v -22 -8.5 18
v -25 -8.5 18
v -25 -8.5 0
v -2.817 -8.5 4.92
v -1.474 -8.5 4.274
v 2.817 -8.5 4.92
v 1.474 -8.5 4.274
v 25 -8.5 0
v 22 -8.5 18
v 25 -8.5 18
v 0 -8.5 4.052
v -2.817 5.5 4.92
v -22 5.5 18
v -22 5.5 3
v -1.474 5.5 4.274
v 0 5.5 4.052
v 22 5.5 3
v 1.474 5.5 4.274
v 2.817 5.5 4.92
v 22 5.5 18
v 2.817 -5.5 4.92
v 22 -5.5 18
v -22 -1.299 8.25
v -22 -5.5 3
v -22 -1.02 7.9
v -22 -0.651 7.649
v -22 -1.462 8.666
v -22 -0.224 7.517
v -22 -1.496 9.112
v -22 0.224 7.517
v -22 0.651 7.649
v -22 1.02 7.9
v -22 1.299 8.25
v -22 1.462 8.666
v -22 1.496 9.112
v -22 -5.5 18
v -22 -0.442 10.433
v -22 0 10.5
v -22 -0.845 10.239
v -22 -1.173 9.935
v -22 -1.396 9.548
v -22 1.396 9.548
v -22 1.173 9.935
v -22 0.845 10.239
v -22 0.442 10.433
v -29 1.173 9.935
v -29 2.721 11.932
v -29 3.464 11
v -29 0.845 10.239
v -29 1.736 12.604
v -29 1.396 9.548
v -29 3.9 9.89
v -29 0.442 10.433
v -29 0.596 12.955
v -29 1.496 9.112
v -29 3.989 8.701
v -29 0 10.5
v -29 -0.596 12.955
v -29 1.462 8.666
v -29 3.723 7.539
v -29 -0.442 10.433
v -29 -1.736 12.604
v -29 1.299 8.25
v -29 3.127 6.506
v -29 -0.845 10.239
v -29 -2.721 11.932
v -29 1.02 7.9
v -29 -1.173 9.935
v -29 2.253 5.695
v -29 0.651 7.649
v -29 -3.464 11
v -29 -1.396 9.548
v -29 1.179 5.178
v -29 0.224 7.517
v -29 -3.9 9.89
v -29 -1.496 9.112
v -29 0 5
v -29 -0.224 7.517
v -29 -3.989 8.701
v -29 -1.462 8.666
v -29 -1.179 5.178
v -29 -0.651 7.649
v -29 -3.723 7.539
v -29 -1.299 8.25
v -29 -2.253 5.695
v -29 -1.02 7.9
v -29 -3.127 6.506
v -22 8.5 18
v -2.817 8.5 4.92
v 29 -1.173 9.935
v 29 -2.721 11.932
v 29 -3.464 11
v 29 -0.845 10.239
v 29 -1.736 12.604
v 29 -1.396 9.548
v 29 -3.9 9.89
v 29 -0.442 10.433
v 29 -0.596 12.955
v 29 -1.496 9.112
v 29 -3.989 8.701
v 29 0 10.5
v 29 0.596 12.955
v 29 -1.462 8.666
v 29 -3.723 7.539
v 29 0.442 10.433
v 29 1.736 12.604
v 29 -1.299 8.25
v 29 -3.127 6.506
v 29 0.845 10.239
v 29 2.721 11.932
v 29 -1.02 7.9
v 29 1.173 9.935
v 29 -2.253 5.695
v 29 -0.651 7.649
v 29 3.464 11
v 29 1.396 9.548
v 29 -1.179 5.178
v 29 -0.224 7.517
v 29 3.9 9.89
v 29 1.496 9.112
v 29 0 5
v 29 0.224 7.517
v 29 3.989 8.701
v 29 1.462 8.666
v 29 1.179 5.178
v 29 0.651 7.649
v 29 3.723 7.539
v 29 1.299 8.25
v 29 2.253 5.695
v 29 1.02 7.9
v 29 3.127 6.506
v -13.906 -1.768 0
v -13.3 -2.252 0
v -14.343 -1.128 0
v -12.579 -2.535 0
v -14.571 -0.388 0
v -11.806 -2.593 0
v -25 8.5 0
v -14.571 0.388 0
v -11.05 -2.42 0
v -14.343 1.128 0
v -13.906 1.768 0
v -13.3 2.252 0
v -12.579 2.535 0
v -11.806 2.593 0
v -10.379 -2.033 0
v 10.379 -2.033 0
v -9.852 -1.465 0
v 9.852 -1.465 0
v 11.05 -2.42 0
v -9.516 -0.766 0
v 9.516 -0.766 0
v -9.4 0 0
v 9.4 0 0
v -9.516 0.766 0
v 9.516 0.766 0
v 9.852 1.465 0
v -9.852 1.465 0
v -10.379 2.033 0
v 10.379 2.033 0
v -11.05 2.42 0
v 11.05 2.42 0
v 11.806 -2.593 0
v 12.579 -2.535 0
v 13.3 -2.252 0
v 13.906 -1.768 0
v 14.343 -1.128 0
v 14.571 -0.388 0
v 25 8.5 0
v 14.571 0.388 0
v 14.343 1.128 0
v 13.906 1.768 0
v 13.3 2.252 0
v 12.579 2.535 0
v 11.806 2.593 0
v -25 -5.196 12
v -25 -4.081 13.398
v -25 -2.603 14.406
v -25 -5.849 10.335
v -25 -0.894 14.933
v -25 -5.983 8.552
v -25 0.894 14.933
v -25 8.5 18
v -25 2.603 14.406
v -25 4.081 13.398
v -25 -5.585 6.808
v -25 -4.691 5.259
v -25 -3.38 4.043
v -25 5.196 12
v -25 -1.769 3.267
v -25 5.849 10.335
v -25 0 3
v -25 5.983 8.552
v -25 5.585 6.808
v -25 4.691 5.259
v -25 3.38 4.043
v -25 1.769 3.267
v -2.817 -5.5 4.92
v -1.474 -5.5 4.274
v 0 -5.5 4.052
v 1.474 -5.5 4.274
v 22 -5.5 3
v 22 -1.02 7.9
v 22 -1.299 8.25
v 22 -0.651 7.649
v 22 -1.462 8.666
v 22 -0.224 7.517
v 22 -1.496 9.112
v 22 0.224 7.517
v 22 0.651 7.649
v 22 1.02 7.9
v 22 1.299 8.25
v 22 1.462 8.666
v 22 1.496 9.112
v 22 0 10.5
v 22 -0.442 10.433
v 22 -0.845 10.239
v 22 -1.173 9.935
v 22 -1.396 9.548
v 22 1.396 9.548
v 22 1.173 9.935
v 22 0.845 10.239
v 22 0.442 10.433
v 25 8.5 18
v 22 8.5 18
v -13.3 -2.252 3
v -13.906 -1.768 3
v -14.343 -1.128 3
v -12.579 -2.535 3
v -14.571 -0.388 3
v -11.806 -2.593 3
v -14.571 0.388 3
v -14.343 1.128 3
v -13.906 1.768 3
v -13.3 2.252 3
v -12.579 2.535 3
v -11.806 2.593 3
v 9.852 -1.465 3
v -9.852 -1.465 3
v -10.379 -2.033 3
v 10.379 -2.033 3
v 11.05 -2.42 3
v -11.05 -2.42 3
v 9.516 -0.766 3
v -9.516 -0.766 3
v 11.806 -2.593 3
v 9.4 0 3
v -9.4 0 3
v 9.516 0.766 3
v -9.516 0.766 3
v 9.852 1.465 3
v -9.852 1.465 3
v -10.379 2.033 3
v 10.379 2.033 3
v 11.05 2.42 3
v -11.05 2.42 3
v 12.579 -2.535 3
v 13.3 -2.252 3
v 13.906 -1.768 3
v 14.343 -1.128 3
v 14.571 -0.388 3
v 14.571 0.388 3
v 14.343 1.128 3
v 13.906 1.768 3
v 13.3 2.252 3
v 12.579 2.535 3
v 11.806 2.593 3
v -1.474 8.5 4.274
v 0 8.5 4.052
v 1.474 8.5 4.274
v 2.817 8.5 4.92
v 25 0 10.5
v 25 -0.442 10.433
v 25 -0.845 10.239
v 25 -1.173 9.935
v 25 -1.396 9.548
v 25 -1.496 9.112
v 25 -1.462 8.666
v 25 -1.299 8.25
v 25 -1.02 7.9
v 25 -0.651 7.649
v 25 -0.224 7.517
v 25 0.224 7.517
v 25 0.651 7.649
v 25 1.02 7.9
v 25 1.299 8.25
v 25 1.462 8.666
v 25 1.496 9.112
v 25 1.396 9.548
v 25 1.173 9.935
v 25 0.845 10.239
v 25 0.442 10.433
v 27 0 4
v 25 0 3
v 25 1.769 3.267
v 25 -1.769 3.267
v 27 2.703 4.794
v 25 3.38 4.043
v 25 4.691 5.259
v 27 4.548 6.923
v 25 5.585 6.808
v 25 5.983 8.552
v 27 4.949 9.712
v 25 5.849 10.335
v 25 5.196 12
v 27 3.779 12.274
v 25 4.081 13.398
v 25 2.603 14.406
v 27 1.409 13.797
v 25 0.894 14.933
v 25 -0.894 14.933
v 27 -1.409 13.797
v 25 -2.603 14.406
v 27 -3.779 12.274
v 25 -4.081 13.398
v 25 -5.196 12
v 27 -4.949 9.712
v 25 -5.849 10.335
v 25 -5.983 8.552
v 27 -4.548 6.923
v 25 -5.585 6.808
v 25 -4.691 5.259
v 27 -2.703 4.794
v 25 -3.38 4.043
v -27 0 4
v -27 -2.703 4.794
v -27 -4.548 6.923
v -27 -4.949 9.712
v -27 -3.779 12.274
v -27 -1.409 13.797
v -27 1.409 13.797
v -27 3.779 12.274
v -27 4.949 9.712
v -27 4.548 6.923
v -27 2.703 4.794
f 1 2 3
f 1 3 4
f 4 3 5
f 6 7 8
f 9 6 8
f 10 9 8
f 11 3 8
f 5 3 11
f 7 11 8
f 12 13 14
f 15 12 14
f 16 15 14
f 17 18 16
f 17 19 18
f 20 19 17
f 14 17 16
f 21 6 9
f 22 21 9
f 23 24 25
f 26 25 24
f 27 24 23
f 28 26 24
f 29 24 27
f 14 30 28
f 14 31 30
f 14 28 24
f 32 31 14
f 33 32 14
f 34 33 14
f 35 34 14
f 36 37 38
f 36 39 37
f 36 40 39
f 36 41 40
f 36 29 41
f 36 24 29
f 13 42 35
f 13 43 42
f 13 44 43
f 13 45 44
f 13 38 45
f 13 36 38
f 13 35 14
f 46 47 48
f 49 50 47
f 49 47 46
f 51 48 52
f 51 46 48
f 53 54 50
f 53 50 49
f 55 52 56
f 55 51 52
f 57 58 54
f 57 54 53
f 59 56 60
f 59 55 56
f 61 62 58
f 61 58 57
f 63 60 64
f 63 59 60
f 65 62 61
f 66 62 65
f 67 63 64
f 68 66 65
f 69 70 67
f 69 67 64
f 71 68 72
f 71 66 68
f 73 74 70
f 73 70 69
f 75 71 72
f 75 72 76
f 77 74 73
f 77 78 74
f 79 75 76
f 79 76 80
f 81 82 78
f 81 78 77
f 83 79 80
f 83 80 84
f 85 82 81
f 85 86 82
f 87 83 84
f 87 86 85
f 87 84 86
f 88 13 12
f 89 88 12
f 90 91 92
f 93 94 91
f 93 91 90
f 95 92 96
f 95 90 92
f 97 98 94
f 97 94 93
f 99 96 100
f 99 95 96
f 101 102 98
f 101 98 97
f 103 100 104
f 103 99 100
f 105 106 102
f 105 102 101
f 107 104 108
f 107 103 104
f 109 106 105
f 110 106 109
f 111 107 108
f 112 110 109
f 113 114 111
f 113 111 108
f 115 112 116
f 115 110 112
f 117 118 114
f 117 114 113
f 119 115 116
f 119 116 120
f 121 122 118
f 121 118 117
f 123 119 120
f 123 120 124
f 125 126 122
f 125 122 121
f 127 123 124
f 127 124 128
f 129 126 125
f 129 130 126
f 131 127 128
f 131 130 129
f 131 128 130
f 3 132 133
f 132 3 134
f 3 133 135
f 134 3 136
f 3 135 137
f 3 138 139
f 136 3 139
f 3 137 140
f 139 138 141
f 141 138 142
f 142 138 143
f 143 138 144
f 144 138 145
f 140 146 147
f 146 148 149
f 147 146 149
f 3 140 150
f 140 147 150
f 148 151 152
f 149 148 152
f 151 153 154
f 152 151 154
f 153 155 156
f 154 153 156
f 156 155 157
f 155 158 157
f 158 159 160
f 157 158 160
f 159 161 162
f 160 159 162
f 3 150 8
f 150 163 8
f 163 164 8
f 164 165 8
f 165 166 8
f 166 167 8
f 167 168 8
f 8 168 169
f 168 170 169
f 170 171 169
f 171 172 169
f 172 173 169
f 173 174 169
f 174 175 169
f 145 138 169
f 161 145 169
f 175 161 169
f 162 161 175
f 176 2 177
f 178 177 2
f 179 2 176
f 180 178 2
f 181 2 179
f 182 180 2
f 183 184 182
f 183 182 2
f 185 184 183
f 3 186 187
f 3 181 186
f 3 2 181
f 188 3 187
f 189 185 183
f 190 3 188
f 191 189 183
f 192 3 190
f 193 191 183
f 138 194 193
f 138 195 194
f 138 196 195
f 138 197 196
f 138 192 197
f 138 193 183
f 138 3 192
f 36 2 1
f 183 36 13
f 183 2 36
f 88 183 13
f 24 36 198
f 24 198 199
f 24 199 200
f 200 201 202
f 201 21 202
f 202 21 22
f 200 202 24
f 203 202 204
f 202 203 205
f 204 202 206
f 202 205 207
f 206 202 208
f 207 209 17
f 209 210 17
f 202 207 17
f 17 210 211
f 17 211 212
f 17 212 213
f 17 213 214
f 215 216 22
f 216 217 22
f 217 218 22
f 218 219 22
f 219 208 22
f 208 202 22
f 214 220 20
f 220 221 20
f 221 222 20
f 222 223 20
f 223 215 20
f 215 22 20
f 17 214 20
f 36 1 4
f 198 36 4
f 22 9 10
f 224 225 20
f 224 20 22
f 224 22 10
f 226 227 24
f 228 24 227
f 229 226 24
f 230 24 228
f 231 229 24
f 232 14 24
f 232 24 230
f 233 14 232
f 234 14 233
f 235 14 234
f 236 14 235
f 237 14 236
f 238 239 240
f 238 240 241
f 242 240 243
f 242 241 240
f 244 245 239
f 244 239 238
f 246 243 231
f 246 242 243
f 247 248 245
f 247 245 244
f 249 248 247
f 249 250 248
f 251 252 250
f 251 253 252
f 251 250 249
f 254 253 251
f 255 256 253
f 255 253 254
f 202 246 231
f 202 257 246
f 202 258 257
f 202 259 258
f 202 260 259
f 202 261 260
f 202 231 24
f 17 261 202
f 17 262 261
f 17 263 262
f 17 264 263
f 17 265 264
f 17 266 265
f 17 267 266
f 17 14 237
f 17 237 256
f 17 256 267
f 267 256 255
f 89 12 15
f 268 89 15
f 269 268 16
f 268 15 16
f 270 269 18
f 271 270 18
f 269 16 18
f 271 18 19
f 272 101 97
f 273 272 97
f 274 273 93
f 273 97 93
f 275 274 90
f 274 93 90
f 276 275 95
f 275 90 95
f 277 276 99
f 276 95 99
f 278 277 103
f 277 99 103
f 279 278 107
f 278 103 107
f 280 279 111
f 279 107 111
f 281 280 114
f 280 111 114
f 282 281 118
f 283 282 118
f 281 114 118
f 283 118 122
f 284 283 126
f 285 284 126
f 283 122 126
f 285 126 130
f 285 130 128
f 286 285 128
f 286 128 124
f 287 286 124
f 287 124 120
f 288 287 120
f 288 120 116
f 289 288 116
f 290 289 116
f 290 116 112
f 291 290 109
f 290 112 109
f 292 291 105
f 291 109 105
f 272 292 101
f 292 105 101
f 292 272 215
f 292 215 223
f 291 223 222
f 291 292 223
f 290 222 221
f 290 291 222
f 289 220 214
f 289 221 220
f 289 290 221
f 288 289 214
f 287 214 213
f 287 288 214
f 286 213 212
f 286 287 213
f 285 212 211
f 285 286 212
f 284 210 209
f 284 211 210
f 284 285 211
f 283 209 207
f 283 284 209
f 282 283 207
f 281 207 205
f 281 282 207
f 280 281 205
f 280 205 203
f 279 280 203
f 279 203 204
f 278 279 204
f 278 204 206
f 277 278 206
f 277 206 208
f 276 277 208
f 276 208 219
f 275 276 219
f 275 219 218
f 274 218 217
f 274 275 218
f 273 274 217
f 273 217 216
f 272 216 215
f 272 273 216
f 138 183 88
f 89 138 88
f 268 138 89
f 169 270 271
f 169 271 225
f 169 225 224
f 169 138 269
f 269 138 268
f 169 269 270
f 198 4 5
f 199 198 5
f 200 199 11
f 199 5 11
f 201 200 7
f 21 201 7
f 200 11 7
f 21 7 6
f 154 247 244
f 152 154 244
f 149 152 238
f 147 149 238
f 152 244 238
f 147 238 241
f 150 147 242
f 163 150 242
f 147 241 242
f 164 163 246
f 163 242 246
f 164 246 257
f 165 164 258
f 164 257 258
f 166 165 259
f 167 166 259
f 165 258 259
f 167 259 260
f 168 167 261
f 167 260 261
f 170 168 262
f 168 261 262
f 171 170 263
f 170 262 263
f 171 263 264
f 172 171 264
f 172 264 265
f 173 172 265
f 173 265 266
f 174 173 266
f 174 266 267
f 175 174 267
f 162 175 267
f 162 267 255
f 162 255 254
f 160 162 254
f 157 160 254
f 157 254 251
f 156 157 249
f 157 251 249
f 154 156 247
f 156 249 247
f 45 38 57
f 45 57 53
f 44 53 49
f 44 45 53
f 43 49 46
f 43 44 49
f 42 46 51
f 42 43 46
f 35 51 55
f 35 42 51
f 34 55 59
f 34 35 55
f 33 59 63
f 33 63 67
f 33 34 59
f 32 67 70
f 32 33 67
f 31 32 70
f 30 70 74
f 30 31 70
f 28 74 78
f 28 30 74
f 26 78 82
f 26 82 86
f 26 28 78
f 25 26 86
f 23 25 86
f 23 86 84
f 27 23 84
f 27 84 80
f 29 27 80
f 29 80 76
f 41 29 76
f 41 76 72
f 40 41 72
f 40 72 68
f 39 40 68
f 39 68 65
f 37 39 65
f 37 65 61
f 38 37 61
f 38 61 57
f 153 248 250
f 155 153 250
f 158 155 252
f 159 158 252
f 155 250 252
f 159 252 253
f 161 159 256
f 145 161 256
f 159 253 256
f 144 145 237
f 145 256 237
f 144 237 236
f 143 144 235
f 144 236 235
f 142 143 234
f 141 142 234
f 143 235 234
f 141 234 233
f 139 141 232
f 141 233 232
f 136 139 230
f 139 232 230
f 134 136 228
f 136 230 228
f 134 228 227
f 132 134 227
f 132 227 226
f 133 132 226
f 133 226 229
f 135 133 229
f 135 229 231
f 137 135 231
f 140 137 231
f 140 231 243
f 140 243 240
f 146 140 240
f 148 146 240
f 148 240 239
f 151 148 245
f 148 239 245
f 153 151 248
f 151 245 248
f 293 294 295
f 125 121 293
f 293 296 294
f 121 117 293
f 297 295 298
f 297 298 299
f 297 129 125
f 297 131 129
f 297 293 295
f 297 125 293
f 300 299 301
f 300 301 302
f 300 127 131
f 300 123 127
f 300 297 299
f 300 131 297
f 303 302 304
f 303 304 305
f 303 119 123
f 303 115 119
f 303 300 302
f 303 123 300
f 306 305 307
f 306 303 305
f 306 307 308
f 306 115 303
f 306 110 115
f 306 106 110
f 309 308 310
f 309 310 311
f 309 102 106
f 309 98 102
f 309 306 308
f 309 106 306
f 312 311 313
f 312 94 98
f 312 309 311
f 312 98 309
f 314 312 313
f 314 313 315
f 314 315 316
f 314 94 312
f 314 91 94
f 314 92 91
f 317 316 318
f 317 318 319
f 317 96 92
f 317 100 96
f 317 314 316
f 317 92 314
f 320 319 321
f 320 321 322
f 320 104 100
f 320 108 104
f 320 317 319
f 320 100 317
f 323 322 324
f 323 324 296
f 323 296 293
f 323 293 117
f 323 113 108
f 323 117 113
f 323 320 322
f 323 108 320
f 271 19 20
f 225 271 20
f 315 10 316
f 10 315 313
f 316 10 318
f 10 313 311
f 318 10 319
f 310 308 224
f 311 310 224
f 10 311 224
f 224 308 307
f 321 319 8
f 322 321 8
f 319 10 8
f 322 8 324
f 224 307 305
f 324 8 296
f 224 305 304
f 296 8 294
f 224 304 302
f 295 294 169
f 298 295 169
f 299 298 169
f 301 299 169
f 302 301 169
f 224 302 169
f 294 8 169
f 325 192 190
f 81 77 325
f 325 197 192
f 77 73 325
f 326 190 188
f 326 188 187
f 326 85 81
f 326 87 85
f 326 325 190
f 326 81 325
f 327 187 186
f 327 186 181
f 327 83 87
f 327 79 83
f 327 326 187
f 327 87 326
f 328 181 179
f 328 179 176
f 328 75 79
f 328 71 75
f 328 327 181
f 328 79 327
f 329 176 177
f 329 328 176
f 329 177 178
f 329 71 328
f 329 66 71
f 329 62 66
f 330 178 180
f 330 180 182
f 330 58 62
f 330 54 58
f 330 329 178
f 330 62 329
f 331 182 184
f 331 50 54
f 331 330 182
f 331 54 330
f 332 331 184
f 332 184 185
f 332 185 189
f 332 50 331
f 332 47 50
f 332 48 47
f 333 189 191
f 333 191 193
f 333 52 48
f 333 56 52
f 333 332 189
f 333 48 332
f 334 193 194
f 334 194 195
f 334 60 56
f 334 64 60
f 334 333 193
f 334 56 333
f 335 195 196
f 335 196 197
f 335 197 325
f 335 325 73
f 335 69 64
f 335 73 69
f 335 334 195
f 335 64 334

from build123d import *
from OCP.BRepFilletAPI import BRepFilletAPI_MakeChamfer

# Parameters (mm, degrees)
SKETCH_1_W               = 50
SKETCH_1_H               = 17
EXTRUDE_1_DEPTH          = 18
SKETCH_2_W               = 44
SKETCH_2_H               = 11
CUT_EXTRUDE_1_DEPTH      = 15
CUT_EXTRUDE_2_DEPTH      = 36.185224172
CUT_EXTRUDE_2_DEPTH_BACK = 17
SKETCH_4_R               = 2.6
CUT_EXTRUDE_4_DEPTH      = 3
SKETCH_5_R               = 4
SKETCH_5_R_2             = 1.5
EXTRUDE_2_DEPTH          = 4
EXTRUDE_START            = 4
SKETCH_6_R               = 4
SKETCH_6_R_2             = 1.5
EXTRUDE_3_DEPTH          = 4
CHAMFER_1_SIZE           = 2
CHAMFER_1_SIZE_2         = 4
CUT_EXTRUDE_START        = -50
SKETCH_7_R               = 1.5
CUT_EXTRUDE_5_DEPTH      = 50


with BuildPart() as part:
    # 草图1 → 凸台-拉伸1 (new body)
    with BuildSketch(Plane.XY):
        Rectangle(SKETCH_1_W, SKETCH_1_H)
    extrude(amount=EXTRUDE_1_DEPTH)

    # 草图2 → 切除-拉伸1 (cut)
    with BuildSketch(Plane.XY.offset(18)):
        Rectangle(SKETCH_2_W, SKETCH_2_H)
    extrude(amount=-CUT_EXTRUDE_1_DEPTH, mode=Mode.SUBTRACT)

    # 草图3 → 切除-拉伸2 (cut, two sides: drawn at the far end of the back side and taken through both)
    with BuildSketch(Plane(origin=(0, 8.5, 0), x_dir=(1, 0, 0), z_dir=(0, 1, 0)).offset(-CUT_EXTRUDE_2_DEPTH_BACK)):
        with BuildLine():
            Line((-113.428530012, -80.337634099), (-22, -18))
            Line((-22, -18), (-2.816684123, -4.920466448))
            ThreePointArc((-2.816684123, -4.920466448), (0, -4.051603162), (2.816684123, -4.920466448))
            Line((2.816684123, -4.920466448), (22, -18))
            Line((22, -18), (113.428530012, -80.337634099))
            Line((113.428530012, -80.337634099), (113.428530012, -301.653306613))
            Line((113.428530012, -301.653306613), (-113.428530012, -301.653306613))
            Line((-113.428530012, -301.653306613), (-113.428530012, -80.337634099))
        make_face()
    extrude(amount=CUT_EXTRUDE_2_DEPTH + CUT_EXTRUDE_2_DEPTH_BACK, mode=Mode.SUBTRACT)

    # 草图4 → 切除-拉伸4 (cut)
    with BuildSketch(Plane.XY.offset(3)):
        with Locations((-12, 0)):
            Circle(SKETCH_4_R)
        with Locations(Location((12, 0, 0), (0, 0, 180))):
            Circle(SKETCH_4_R)
    extrude(amount=-CUT_EXTRUDE_4_DEPTH, mode=Mode.SUBTRACT)

    # 草图5 → 凸台-拉伸2 (add)
    with BuildSketch(Plane.ZY.offset(25)):
        with Locations(Location((9, 0, 0), (0, 0, 180))):
            Circle(SKETCH_5_R)
        with Locations((9, 0)):
            Circle(SKETCH_5_R_2, mode=Mode.SUBTRACT)
    extrude(amount=EXTRUDE_2_DEPTH)

    # 草图6 → 凸台-拉伸3 (add)
    with BuildSketch(Plane(origin=(25, 0, 0), x_dir=(0, 0, -1), z_dir=(1, 0, 0)).offset(EXTRUDE_START)):
        with Locations((-9, 0)):
            Circle(SKETCH_6_R)
        with Locations(Location((-9, 0, 0), (0, 0, 180))):
            Circle(SKETCH_6_R_2, mode=Mode.SUBTRACT)
    extrude(amount=-EXTRUDE_3_DEPTH)

    # 倒角1
    chamfer_1_edges_1 = [part.edges().sort_by_distance(p)[0] for p in [
        (-25, 0, 13),
    ]]
    chamfer_1_side_1 = [part.faces().sort_by_distance(p)[0] for p in [
        (-25, 0, 13.04),
    ]]
    chamfer_1_edges_2 = [part.edges().sort_by_distance(p)[0] for p in [
        (25, 0, 13),
    ]]
    chamfer_1_side_2 = [part.faces().sort_by_distance(p)[0] for p in [
        (25, 0, 13.04),
    ]]
    chamfer_1 = BRepFilletAPI_MakeChamfer(part.part.solid().wrapped)
    for e in chamfer_1_edges_1:
        chamfer_1.Add(CHAMFER_1_SIZE - 0.0001, CHAMFER_1_SIZE_2 - 0.0001, e.wrapped, chamfer_1_side_1[0].wrapped)
    for e in chamfer_1_edges_2:
        chamfer_1.Add(CHAMFER_1_SIZE - 0.0001, CHAMFER_1_SIZE_2 - 0.0001, e.wrapped, chamfer_1_side_2[0].wrapped)
    add(Compound.cast(chamfer_1.Shape()), mode=Mode.REPLACE)  # a hair under: the kernel refuses the full size

    # 草图7 → 切除-拉伸5 (cut)
    with BuildSketch(Plane.ZY.offset(25).offset(CUT_EXTRUDE_START)):
        with Locations((9, 0)):
            Circle(SKETCH_7_R)
    extrude(amount=CUT_EXTRUDE_5_DEPTH, mode=Mode.SUBTRACT)


solid = part.part
